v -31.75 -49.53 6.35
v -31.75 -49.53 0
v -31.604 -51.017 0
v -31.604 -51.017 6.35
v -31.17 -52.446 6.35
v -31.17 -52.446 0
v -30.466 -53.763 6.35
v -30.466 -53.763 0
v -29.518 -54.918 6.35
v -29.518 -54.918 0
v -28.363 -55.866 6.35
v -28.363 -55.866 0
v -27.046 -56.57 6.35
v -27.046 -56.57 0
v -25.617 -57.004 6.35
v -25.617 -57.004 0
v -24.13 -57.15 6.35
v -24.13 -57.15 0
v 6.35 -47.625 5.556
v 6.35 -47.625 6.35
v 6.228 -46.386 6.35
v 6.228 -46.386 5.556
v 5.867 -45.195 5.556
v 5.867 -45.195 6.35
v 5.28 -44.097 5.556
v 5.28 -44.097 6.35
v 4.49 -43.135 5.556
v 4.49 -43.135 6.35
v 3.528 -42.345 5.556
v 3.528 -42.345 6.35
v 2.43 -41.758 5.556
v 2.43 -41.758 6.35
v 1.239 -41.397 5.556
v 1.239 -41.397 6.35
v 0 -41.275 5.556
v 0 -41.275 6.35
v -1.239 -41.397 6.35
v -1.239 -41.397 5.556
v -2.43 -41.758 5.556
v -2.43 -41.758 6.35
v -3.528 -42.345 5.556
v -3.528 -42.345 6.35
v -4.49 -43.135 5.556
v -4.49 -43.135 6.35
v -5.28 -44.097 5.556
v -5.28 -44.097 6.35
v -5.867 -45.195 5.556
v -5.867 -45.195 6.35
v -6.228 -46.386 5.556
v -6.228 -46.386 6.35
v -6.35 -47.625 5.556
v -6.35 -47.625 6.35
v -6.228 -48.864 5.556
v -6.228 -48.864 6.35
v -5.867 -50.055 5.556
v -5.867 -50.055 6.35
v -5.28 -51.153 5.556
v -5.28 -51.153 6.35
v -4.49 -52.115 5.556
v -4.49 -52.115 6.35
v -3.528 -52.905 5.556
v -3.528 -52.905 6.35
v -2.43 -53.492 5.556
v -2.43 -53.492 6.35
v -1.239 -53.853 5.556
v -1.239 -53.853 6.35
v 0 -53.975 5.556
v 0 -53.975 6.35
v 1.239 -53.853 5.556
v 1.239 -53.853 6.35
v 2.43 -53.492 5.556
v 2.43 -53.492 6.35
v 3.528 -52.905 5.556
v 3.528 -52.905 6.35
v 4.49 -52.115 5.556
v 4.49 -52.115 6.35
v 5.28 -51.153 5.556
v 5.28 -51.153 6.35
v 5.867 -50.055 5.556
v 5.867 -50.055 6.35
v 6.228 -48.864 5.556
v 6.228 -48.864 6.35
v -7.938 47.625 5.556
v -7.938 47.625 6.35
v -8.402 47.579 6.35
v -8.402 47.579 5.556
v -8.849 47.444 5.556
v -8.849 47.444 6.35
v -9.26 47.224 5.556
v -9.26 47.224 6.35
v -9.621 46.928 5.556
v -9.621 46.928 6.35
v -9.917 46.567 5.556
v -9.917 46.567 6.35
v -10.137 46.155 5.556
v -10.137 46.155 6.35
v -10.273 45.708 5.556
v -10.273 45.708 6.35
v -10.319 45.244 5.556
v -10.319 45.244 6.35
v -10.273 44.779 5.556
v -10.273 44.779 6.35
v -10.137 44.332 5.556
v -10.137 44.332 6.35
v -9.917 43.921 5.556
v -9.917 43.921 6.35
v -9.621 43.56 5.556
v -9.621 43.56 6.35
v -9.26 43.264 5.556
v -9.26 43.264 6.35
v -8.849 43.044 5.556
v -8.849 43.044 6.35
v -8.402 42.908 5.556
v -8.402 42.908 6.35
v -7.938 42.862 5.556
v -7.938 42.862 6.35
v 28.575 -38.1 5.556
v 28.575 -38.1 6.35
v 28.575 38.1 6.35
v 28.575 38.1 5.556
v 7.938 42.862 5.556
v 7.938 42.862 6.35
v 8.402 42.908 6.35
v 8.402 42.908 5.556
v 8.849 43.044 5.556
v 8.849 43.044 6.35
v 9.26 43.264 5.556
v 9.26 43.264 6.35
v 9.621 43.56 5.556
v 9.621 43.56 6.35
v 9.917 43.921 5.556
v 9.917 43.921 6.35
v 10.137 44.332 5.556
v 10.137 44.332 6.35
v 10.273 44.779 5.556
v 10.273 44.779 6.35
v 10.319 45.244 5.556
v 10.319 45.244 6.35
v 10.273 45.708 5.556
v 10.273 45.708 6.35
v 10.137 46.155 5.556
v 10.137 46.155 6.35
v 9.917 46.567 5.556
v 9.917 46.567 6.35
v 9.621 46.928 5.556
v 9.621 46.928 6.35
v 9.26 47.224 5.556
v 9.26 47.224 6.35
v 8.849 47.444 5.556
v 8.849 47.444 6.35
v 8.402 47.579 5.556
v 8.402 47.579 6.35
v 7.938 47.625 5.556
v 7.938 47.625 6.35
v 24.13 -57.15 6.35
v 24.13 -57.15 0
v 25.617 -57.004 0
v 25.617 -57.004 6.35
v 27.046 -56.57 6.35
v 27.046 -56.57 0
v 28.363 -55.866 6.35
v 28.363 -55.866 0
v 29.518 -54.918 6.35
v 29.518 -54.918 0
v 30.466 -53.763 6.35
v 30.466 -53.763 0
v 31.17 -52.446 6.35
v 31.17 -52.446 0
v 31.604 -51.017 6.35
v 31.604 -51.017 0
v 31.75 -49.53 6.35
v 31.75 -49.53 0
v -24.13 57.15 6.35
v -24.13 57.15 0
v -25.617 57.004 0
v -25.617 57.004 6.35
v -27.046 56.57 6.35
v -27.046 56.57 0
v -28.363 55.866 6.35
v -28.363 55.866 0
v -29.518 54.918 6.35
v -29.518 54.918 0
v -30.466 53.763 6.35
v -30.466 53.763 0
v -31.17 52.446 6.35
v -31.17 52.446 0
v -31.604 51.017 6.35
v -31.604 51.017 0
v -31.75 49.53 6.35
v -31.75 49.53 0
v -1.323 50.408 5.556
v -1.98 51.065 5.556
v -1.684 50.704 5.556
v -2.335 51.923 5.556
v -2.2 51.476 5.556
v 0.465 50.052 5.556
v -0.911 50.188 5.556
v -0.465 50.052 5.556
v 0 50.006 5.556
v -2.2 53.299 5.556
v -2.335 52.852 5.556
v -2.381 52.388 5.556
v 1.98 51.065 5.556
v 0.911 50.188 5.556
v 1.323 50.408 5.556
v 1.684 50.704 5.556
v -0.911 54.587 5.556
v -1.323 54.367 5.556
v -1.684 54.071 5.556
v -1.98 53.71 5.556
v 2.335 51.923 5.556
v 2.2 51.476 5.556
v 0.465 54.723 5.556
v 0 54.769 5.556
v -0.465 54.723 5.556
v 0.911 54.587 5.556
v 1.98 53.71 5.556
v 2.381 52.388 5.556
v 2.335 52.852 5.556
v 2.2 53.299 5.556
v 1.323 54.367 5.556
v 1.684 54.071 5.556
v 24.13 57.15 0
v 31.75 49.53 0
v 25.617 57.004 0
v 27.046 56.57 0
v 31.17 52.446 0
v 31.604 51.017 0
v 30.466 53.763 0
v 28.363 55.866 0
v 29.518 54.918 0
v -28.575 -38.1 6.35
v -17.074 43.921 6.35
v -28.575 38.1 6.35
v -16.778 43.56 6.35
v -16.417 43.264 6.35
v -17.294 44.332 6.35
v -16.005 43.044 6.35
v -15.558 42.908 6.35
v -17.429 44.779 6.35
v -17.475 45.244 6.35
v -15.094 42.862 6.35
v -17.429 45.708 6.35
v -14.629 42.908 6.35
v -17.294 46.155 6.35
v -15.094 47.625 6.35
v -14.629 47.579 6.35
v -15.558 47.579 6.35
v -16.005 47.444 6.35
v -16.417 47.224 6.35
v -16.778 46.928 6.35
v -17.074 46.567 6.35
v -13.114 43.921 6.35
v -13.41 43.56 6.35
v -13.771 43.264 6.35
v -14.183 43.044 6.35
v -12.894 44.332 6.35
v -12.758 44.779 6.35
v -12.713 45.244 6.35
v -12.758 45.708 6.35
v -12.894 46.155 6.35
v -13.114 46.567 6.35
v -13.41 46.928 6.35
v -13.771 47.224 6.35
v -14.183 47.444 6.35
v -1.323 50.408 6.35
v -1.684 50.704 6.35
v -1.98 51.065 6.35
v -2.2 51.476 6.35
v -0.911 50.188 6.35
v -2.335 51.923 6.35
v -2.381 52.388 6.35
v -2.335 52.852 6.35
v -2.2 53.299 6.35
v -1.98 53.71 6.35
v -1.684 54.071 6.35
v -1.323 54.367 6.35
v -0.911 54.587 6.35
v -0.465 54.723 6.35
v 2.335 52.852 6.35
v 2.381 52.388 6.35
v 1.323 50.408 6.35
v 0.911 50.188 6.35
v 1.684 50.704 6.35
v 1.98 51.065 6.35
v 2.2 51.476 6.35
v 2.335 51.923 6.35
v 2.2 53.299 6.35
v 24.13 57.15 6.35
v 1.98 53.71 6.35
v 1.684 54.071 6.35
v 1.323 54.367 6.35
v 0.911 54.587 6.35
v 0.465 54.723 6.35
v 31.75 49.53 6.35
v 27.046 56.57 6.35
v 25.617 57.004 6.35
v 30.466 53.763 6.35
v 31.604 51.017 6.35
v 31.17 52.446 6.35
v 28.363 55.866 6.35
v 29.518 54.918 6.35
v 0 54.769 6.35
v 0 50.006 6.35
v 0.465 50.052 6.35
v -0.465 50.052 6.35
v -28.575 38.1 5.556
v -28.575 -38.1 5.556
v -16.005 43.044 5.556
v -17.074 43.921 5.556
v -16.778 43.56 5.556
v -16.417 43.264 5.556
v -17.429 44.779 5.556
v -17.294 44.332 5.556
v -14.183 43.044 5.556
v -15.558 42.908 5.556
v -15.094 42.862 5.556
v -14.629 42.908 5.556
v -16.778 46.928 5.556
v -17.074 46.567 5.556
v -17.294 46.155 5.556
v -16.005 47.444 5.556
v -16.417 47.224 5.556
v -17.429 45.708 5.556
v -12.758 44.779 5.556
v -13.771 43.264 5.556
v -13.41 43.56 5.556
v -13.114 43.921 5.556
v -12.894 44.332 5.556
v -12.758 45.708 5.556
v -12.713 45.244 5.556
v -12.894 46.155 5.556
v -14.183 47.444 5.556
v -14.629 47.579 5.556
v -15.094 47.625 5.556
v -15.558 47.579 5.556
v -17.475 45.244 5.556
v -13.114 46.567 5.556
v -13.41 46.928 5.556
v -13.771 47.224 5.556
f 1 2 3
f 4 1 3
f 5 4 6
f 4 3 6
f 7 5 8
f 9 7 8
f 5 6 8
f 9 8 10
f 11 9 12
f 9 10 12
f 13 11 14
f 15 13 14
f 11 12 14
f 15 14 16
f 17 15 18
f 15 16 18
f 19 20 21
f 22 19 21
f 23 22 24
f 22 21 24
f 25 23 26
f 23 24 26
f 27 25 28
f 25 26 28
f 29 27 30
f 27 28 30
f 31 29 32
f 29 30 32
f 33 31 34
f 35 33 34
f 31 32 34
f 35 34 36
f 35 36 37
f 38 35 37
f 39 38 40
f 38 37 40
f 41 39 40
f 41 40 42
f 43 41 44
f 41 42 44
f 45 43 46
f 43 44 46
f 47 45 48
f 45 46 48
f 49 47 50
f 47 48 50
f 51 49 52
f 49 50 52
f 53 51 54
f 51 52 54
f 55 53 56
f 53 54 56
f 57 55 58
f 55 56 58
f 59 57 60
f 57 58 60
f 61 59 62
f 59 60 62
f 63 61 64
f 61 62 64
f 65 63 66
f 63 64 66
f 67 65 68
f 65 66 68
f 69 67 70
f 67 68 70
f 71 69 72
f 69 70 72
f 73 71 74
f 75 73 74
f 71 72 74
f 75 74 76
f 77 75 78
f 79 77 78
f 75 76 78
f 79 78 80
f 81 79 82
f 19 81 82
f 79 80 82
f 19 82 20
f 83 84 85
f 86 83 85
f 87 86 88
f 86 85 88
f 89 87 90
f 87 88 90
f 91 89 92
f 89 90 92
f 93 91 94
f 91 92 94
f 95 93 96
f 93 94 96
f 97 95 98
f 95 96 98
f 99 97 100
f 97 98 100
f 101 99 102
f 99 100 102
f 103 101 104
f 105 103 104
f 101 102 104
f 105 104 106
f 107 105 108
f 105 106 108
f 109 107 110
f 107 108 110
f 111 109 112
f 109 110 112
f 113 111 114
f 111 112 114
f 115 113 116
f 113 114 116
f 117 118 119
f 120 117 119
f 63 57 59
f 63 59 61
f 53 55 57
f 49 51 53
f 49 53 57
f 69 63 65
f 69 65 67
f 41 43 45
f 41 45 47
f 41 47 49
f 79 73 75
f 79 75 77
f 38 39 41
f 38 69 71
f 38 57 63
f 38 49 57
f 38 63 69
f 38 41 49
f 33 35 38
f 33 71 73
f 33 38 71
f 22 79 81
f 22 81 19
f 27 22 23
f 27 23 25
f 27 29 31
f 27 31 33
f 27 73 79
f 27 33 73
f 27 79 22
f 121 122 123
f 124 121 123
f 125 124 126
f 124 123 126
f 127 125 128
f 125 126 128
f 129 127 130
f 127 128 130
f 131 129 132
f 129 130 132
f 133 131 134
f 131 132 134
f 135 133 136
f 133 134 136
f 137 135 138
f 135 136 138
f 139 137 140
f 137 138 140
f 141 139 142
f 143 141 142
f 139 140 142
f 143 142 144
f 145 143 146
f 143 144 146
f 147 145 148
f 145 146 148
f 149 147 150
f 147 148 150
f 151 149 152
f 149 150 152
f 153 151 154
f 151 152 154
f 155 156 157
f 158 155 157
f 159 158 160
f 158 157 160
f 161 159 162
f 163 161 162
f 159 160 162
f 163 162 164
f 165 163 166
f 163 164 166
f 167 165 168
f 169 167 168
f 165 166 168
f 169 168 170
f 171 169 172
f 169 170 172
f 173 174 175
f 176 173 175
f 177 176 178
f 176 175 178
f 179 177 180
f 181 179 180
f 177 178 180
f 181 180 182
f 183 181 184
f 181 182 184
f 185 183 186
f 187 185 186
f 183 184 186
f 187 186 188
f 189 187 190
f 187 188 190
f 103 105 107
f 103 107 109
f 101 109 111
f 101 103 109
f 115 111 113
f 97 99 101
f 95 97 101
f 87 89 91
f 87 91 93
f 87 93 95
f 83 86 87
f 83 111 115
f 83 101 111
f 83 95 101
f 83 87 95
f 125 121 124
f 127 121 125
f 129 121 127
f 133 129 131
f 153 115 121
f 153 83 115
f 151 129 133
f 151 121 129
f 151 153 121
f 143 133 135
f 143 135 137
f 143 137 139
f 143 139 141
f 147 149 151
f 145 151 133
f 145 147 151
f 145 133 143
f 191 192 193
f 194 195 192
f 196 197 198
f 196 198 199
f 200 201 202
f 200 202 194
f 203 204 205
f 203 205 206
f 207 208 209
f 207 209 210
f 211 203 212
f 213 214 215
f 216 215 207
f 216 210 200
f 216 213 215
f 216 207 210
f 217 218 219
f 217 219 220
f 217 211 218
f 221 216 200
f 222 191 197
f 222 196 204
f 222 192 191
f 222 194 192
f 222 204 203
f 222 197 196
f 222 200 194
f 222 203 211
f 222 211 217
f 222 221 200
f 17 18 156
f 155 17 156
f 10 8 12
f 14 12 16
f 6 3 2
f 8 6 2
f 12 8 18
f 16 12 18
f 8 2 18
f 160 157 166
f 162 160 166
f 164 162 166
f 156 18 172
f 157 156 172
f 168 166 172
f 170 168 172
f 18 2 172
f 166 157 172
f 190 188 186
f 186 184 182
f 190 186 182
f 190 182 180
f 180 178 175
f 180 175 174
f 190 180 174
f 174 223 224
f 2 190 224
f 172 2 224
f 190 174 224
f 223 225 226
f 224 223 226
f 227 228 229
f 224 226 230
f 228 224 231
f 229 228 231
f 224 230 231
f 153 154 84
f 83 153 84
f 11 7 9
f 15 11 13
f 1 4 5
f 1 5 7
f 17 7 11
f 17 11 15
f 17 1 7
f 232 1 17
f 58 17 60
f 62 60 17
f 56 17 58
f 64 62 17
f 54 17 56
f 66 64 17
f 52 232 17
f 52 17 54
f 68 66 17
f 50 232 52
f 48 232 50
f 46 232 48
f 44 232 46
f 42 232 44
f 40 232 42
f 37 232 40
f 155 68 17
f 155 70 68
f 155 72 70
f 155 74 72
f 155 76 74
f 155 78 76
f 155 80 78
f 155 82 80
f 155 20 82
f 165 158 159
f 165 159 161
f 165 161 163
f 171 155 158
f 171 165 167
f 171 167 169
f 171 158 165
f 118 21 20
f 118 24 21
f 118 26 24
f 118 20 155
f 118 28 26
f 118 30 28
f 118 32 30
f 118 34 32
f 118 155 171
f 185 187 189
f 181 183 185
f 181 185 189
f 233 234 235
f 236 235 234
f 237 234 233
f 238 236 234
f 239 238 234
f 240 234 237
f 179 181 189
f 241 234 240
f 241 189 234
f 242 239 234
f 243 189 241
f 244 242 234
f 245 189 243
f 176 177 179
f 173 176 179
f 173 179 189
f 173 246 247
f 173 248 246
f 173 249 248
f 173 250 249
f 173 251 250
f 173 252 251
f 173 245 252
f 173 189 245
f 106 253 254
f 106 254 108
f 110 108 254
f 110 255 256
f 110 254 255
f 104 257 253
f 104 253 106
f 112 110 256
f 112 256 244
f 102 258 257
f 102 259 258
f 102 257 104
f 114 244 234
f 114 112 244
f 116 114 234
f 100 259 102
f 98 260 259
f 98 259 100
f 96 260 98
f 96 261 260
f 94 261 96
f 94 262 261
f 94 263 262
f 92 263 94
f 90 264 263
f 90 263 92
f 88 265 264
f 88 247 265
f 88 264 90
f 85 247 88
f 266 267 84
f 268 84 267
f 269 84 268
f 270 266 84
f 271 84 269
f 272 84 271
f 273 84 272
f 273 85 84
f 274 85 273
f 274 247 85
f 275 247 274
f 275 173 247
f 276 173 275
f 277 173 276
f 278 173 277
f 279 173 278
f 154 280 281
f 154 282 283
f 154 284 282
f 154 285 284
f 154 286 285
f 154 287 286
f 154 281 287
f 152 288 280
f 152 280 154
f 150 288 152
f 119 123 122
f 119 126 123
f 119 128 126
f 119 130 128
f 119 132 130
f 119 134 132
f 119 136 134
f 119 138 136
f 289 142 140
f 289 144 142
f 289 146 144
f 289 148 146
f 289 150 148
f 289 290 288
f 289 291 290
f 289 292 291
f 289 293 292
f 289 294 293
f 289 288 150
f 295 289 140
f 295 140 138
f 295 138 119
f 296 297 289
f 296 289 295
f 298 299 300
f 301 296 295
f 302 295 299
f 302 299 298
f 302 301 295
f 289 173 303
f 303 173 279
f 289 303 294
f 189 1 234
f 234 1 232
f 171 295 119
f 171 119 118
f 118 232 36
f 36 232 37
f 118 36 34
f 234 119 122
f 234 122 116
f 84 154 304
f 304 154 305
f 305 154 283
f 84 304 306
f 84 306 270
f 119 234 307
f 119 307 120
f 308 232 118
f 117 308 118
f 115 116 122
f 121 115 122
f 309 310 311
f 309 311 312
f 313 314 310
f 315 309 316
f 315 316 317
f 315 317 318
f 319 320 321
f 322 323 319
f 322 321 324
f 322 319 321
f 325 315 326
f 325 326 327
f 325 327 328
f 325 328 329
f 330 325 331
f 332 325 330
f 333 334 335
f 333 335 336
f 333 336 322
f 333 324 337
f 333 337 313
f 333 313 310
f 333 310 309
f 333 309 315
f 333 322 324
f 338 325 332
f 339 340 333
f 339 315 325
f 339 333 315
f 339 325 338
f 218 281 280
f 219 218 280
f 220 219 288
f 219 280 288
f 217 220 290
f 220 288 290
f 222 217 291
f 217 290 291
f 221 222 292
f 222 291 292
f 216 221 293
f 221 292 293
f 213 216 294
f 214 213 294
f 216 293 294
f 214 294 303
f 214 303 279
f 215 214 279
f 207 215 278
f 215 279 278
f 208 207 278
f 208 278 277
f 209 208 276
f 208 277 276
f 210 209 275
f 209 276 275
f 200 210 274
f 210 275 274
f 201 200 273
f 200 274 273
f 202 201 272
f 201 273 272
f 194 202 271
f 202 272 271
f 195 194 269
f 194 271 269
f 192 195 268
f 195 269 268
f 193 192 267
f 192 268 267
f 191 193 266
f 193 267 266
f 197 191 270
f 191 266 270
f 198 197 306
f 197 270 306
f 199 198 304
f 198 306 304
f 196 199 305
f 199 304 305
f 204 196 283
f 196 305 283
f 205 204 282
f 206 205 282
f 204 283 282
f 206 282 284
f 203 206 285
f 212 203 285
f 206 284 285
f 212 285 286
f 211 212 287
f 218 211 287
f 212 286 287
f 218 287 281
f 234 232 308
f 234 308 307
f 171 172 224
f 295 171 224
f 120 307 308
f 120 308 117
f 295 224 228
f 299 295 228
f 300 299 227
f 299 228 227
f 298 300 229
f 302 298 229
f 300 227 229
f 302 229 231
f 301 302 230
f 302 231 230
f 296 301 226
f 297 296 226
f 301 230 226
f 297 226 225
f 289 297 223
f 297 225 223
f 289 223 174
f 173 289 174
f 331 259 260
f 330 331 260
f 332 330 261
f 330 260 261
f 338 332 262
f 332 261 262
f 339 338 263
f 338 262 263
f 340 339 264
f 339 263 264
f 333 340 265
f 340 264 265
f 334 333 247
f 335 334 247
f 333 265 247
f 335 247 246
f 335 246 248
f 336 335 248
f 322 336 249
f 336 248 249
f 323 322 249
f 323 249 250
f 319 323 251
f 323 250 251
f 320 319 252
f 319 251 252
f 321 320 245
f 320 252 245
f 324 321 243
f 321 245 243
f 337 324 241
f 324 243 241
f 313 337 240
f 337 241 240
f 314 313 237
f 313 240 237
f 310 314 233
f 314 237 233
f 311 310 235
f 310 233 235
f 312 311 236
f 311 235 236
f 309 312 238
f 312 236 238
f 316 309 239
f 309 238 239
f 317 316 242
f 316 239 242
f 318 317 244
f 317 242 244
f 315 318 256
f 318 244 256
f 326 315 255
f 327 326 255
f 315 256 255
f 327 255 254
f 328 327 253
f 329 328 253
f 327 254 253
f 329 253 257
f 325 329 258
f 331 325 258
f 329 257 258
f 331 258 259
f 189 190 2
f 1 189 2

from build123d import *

# Parameters (mm, degrees)
F3_DEPTH = 6.35
F0_R     = 6.35
F0_W     = 57.15
F0_H     = 76.2
F0_R_2   = 2.38125
F1_DEPTH = 0.79375


with BuildPart() as f3:
    # F2 (on Top) → F3 (new body)
    with BuildSketch(Plane.XY):
        with BuildLine():
            ThreePointArc((31.75, 49.53), (29.518154, 54.918154), (24.13, 57.15))
            Line((24.13, 57.15), (-24.13, 57.15))
            ThreePointArc((-24.13, 57.15), (-29.518154, 54.918154), (-31.75, 49.53))
            Line((-31.75, 49.53), (-31.75, -49.53))
            ThreePointArc((-31.75, -49.53), (-29.518154, -54.918154), (-24.13, -57.15))
            Line((-24.13, -57.15), (24.13, -57.15))
            ThreePointArc((24.13, -57.15), (29.518154, -54.918154), (31.75, -49.53))
            Line((31.75, -49.53), (31.75, 49.53))
        make_face()
    extrude(amount=F3_DEPTH)

    # F0 (on face) → F1 (cut)
    with BuildSketch(Plane.XY.offset(6.35)):
        with Locations((0, -47.625)):
            Circle(F0_R)
        with BuildLine():
            ThreePointArc((-7.9375, 47.625), (-10.31875, 45.24375), (-7.9375, 42.8625))
            Line((-7.9375, 42.8625), (7.9375, 42.8625))
            ThreePointArc((7.9375, 42.8625), (10.31875, 45.24375), (7.9375, 47.625))
            Line((7.9375, 47.625), (-7.9375, 47.625))
        make_face()
        Rectangle(F0_W, F0_H)
        with Locations((-15.093792, 45.24375)):
            Circle(F0_R_2)
        with Locations((0, 52.3875)):
            Circle(F0_R_2)
    extrude(amount=-F1_DEPTH, mode=Mode.SUBTRACT)


solid = f3.part
